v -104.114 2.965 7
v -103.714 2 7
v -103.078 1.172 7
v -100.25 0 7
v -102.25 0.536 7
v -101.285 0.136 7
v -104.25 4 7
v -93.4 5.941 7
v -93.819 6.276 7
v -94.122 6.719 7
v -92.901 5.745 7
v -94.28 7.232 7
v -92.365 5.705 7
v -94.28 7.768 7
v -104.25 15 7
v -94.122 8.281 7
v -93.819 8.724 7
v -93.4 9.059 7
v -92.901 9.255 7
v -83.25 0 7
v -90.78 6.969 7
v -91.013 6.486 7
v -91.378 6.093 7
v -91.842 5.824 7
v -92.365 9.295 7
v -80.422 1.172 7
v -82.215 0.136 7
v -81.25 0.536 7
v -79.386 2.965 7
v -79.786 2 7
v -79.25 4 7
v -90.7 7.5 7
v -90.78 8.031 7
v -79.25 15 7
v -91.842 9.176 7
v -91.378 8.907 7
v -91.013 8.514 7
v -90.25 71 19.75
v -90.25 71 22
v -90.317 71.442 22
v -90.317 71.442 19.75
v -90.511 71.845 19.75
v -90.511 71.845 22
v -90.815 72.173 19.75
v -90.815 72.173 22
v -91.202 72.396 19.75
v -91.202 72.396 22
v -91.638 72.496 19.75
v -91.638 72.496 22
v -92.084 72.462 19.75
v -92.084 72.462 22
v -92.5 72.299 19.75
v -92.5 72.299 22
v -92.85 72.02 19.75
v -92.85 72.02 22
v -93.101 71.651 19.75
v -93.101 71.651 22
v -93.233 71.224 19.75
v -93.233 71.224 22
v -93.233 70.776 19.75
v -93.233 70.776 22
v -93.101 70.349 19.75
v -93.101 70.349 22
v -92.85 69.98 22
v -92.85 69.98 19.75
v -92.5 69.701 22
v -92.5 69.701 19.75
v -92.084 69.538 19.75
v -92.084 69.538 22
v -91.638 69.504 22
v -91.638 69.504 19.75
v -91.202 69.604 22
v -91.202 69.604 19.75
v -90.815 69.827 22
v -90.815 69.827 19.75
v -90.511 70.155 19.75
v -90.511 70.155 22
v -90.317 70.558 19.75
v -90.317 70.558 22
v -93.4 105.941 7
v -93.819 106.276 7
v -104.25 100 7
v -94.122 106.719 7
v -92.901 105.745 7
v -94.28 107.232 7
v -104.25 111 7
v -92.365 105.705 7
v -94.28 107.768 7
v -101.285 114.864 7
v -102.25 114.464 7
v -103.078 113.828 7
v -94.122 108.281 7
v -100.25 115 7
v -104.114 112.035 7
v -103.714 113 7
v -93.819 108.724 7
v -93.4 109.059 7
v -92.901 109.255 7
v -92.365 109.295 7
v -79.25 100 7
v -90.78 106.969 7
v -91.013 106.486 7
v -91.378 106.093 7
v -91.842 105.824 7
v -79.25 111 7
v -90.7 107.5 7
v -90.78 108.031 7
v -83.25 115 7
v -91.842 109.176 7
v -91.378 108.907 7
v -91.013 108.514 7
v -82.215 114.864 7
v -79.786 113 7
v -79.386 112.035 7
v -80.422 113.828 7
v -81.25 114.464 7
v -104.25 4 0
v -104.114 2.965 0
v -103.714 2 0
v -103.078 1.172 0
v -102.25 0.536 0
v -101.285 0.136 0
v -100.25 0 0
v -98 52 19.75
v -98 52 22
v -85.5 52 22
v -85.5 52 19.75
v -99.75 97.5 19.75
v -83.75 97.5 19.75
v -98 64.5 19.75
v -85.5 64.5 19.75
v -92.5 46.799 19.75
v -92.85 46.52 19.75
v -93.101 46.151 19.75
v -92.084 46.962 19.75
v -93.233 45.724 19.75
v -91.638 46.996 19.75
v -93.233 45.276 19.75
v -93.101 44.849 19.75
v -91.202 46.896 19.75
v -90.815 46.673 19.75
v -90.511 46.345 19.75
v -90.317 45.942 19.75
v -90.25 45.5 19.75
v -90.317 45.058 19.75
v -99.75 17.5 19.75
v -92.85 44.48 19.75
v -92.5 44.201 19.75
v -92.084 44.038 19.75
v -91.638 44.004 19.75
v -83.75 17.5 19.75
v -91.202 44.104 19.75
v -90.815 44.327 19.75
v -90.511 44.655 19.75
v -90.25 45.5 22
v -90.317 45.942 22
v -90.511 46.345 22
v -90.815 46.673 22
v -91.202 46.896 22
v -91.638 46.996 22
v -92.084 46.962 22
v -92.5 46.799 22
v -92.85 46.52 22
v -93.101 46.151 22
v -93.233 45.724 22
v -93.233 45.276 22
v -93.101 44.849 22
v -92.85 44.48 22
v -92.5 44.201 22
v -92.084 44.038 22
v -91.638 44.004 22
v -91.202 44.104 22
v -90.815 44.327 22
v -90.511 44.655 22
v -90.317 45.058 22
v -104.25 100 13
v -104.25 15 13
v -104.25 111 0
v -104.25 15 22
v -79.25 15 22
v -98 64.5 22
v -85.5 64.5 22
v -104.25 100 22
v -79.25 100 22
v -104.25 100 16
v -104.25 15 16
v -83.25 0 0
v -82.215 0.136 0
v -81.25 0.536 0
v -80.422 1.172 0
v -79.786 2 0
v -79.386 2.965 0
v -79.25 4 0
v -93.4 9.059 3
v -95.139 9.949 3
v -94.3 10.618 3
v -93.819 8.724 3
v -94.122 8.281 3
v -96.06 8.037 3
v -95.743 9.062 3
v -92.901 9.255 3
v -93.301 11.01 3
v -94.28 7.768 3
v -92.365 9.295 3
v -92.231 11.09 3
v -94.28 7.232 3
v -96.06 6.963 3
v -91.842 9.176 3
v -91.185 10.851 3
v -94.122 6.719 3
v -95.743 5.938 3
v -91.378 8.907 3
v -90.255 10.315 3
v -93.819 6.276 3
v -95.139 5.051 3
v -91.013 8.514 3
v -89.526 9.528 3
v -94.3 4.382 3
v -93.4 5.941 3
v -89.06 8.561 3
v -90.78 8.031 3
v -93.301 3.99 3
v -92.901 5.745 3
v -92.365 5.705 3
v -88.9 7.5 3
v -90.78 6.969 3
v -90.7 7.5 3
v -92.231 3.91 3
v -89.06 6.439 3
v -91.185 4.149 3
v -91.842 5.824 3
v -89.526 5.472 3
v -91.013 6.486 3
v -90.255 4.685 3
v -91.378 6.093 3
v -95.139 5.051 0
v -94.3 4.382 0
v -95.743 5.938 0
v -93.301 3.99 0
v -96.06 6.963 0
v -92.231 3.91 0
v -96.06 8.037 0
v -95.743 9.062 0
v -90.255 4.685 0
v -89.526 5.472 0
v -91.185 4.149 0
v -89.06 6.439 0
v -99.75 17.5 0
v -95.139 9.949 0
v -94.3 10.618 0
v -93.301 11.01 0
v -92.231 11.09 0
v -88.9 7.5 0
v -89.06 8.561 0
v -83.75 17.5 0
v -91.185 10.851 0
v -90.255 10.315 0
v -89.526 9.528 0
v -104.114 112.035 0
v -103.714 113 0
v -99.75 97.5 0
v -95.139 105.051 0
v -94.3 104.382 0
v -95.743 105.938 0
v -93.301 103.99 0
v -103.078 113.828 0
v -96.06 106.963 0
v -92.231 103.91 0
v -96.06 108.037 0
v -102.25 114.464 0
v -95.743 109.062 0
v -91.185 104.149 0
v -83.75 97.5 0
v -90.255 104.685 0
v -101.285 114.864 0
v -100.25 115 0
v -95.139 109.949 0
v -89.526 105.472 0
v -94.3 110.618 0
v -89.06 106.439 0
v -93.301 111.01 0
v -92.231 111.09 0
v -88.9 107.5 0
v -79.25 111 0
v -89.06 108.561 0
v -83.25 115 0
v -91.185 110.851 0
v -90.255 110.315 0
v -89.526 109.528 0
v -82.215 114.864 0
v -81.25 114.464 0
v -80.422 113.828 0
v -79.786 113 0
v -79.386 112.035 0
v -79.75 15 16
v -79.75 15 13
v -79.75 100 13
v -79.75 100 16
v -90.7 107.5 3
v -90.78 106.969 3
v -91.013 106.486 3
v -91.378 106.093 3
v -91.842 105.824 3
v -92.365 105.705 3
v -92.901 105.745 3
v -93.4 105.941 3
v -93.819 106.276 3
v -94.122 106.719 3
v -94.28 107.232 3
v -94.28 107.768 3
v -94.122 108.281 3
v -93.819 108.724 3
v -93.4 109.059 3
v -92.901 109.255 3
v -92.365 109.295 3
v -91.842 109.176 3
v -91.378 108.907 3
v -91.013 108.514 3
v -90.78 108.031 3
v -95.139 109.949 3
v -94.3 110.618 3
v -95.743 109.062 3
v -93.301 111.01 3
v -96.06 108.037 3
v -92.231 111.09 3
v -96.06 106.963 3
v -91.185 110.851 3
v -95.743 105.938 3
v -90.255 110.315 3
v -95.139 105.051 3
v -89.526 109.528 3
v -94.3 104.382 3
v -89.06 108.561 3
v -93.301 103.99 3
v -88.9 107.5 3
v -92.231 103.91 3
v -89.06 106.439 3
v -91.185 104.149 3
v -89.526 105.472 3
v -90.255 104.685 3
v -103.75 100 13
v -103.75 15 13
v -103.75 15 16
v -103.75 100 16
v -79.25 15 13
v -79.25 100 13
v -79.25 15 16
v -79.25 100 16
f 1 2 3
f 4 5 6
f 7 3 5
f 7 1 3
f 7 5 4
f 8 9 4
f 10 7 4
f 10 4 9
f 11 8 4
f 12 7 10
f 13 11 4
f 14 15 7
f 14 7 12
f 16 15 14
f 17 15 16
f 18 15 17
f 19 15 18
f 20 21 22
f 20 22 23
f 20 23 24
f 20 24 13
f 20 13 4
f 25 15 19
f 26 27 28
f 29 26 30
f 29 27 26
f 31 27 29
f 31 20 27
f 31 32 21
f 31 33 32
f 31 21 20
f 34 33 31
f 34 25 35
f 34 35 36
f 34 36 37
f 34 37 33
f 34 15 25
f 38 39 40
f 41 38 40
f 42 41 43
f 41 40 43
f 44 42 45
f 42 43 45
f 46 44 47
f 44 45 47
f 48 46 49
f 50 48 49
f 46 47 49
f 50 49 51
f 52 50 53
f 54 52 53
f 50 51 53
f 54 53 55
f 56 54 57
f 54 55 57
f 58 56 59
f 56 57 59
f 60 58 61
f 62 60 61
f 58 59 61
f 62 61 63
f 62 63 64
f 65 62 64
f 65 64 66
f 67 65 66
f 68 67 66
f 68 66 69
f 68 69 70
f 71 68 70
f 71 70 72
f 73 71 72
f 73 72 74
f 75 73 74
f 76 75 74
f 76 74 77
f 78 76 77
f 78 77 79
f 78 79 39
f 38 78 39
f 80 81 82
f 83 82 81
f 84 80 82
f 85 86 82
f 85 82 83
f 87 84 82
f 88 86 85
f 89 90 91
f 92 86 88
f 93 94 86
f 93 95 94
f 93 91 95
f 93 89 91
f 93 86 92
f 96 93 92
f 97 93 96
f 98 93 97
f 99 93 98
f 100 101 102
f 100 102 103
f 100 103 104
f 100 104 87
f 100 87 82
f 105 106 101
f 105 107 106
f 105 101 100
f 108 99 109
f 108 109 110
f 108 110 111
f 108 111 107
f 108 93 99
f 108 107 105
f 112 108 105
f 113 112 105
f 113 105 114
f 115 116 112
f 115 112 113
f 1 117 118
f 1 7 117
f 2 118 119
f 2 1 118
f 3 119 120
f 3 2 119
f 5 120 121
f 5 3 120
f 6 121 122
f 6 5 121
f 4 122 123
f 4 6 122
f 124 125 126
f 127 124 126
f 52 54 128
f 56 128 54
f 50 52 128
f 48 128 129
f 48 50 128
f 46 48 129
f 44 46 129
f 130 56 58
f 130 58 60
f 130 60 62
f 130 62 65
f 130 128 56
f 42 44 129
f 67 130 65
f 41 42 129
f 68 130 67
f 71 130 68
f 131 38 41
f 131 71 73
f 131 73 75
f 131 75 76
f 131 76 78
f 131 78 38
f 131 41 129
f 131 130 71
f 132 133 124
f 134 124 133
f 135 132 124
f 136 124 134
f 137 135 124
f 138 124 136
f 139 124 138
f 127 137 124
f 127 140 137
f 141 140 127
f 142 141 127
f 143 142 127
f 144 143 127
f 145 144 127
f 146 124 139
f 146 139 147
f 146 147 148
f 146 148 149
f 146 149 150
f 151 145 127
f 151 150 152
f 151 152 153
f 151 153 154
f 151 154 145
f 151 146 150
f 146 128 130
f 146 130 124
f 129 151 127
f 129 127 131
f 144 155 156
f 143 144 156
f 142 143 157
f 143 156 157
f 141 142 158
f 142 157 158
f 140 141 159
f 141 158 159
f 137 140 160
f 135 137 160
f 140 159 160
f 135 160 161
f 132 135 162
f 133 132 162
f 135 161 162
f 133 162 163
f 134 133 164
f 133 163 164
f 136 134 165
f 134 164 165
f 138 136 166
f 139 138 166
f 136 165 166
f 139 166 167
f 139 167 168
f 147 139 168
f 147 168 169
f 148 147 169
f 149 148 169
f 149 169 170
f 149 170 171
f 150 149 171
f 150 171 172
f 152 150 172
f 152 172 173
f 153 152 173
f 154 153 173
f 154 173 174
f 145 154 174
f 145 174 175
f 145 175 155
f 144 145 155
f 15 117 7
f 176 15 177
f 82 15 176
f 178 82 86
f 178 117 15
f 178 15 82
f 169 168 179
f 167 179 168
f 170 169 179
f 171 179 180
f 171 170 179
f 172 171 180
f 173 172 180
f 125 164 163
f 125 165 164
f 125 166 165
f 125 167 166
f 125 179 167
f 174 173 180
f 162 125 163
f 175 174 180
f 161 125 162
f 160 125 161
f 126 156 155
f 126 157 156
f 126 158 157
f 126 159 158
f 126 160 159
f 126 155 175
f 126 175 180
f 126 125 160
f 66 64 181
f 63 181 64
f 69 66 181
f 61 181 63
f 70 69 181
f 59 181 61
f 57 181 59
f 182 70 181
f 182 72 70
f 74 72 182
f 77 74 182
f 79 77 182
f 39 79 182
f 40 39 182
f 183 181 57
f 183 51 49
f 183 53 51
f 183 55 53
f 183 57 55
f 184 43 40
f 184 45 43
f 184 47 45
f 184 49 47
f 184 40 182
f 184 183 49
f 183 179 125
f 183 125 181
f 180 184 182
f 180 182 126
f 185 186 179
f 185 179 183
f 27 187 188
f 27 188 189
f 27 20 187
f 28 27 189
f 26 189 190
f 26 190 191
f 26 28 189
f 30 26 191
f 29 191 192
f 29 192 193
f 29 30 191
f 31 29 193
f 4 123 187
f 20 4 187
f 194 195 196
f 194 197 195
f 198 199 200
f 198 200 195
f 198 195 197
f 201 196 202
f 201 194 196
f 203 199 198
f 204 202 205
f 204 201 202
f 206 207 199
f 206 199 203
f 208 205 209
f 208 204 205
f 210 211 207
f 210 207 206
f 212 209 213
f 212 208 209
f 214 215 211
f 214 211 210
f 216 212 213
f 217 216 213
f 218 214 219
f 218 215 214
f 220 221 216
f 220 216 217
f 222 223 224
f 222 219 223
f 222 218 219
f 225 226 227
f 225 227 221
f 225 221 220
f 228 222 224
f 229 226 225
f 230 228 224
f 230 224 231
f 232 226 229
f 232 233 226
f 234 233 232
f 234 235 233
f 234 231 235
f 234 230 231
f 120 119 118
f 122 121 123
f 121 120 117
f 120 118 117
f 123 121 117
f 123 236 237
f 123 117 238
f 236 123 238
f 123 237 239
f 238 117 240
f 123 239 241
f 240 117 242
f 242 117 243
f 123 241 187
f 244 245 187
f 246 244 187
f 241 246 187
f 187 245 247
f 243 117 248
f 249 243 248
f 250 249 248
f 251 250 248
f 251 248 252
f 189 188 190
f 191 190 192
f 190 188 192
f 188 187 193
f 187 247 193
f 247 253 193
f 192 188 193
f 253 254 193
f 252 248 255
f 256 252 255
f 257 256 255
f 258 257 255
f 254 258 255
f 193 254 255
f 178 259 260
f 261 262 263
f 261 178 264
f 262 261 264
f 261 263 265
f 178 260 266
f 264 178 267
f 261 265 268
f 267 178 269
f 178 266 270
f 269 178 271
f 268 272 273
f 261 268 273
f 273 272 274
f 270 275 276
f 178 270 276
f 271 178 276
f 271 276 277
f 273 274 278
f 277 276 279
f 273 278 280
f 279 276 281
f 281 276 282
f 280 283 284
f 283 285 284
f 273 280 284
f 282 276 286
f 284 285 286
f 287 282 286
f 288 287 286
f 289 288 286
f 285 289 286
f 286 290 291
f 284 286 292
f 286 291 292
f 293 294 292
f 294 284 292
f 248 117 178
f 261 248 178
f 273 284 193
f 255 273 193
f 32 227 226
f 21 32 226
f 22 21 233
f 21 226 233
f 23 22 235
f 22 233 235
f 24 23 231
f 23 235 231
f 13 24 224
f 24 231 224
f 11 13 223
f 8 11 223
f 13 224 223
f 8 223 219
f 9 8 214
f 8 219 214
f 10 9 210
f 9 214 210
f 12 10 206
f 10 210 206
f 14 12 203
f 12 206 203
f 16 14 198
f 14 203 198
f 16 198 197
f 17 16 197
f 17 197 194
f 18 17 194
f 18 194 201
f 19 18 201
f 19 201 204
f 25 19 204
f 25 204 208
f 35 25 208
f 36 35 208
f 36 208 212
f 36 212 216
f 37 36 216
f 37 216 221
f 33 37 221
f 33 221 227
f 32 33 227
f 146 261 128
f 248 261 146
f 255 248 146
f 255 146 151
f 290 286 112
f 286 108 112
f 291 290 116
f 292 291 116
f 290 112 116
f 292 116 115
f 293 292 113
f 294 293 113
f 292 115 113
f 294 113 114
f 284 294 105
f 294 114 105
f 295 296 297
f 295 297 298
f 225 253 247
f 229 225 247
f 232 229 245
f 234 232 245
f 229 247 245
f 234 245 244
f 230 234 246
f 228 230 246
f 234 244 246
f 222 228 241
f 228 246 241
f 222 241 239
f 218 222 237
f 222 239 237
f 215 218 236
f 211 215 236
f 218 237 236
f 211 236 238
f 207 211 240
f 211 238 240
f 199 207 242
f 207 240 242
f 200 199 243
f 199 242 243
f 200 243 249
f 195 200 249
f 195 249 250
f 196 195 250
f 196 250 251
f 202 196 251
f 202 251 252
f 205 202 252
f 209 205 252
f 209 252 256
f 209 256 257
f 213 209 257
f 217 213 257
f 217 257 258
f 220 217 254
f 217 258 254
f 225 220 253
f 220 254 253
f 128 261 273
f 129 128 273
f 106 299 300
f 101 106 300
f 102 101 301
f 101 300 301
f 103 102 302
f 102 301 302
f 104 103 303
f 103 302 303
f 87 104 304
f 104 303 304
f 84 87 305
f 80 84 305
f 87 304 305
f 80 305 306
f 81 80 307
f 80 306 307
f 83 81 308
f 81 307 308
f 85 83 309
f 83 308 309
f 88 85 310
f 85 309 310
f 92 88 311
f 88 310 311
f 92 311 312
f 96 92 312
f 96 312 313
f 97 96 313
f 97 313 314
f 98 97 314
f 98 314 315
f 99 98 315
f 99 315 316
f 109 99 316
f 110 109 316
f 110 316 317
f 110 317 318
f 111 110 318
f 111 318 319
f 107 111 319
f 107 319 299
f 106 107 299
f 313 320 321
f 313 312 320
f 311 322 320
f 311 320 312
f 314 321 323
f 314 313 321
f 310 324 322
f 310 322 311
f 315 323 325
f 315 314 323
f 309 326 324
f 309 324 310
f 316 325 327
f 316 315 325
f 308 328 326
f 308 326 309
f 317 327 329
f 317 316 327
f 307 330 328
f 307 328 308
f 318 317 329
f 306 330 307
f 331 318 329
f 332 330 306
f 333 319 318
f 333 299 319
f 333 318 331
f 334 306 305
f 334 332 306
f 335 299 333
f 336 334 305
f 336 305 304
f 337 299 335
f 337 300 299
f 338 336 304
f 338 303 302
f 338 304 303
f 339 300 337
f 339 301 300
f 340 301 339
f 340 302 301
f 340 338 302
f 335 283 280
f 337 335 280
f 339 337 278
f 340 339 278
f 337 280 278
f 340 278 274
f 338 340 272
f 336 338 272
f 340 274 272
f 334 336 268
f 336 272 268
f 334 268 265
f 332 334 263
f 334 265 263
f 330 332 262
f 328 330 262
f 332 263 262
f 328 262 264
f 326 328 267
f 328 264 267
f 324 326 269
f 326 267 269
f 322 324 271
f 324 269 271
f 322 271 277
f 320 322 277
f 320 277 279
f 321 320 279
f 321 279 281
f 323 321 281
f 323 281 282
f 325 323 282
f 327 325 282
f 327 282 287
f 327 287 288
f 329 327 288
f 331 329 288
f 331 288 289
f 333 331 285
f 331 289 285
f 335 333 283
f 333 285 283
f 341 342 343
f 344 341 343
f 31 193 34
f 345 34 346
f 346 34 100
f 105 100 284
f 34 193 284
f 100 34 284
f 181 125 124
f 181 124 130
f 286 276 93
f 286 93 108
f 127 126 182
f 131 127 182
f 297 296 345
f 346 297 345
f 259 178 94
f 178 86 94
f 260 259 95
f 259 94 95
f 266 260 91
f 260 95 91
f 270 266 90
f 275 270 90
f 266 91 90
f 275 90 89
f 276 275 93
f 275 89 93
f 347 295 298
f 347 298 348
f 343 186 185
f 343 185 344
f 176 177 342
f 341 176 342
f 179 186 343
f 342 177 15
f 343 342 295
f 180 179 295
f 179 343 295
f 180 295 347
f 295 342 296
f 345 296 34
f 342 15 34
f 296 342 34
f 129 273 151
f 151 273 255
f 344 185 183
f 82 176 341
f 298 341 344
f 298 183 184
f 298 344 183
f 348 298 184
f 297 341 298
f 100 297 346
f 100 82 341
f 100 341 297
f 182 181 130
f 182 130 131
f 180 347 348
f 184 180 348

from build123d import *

# Parameters (mm, degrees)
SKETCH019_W     = 25
SKETCH019_H     = 115
PAD002_DEPTH    = 7
SKETCH020_W     = 25
SKETCH020_H     = 85
PAD003_DEPTH    = 15
SKETCH021_W     = 12.5
SKETCH021_H     = 12.5
POCKET017_DEPTH = 22.001
SKETCH022_R     = 1.5
POCKET018_DEPTH = 22.001
SKETCH023_W     = 16
SKETCH023_H     = 80
POCKET019_DEPTH = 19.75
SKETCH024_W     = 1
SKETCH024_H     = 3
POCKET020_DEPTH = 100.001
SKETCH025_R     = 1.8
POCKET021_DEPTH = 22.001
SKETCH026_R     = 3.6
POCKET022_DEPTH = 3
FILLET004_R     = 4


with BuildPart() as part:
    # Sketch019 → Pad002 (new body)
    with BuildSketch(Plane.XY):
        with Locations((-91.75, 57.5)):
            Rectangle(SKETCH019_W, SKETCH019_H)
    extrude(amount=PAD002_DEPTH)

    # Sketch020 → Pad003 (new body)
    with BuildSketch(Plane.XY.offset(7)):
        with Locations((-91.75, 57.5)):
            Rectangle(SKETCH020_W, SKETCH020_H)
    extrude(amount=PAD003_DEPTH)

    # Sketch021 → Pocket017 (cut, through all)
    with BuildSketch(Plane.XY.offset(22)):
        with Locations((-91.75, 58.25)):
            Rectangle(SKETCH021_W, SKETCH021_H)
    extrude(amount=-POCKET017_DEPTH, mode=Mode.SUBTRACT)

    # Sketch022 → Pocket018 (cut, through all)
    with BuildSketch(Plane.XY.offset(22)):
        with Locations((-91.75, 71)):
            Circle(SKETCH022_R)
        with Locations((-91.75, 45.5)):
            Circle(SKETCH022_R)
    extrude(amount=-POCKET018_DEPTH, mode=Mode.SUBTRACT)

    # Sketch023 → Pocket019 (cut)
    with BuildSketch(Plane(origin=(0, 0, 0), x_dir=(1, 0, 0), z_dir=(0, 0, -1))):
        with Locations((-91.75, -57.5)):
            Rectangle(SKETCH023_W, SKETCH023_H)
    extrude(amount=-POCKET019_DEPTH, mode=Mode.SUBTRACT)

    # Sketch024 → Pocket020 (cut, through all)
    with BuildSketch(Plane.XZ.offset(-15)):
        with Locations((-104.25, 14.5)):
            Rectangle(SKETCH024_W, SKETCH024_H)
        with Locations((-79.25, 14.5)):
            Rectangle(SKETCH024_W, SKETCH024_H)
    extrude(amount=-POCKET020_DEPTH, mode=Mode.SUBTRACT)

    # Sketch025 → Pocket021 (cut, through all)
    with BuildSketch(Plane(origin=(0, 0, 0), x_dir=(1, 0, 0), z_dir=(0, 0, -1))):
        with Locations((-92.5, -107.5)):
            Circle(SKETCH025_R)
        with Locations((-92.5, -7.5)):
            Circle(SKETCH025_R)
    extrude(amount=-POCKET021_DEPTH, mode=Mode.SUBTRACT)

    # Sketch026 → Pocket022 (cut)
    with BuildSketch(Plane(origin=(0, 0, 0), x_dir=(1, 0, 0), z_dir=(0, 0, -1))):
        with Locations((-92.5, -7.5)):
            Circle(SKETCH026_R)
        with Locations((-92.5, -107.5)):
            Circle(SKETCH026_R)
    extrude(amount=-POCKET022_DEPTH, mode=Mode.SUBTRACT)

    # Fillet004
    fillet004_edges = [part.edges().sort_by_distance(p)[0] for p in [
        (-104.25, 115, 3.5),
        (-79.25, 115, 3.5),
        (-79.25, 0, 3.5),
        (-104.25, 0, 3.5),
    ]]
    fillet(fillet004_edges, radius=FILLET004_R)


solid = part.part
